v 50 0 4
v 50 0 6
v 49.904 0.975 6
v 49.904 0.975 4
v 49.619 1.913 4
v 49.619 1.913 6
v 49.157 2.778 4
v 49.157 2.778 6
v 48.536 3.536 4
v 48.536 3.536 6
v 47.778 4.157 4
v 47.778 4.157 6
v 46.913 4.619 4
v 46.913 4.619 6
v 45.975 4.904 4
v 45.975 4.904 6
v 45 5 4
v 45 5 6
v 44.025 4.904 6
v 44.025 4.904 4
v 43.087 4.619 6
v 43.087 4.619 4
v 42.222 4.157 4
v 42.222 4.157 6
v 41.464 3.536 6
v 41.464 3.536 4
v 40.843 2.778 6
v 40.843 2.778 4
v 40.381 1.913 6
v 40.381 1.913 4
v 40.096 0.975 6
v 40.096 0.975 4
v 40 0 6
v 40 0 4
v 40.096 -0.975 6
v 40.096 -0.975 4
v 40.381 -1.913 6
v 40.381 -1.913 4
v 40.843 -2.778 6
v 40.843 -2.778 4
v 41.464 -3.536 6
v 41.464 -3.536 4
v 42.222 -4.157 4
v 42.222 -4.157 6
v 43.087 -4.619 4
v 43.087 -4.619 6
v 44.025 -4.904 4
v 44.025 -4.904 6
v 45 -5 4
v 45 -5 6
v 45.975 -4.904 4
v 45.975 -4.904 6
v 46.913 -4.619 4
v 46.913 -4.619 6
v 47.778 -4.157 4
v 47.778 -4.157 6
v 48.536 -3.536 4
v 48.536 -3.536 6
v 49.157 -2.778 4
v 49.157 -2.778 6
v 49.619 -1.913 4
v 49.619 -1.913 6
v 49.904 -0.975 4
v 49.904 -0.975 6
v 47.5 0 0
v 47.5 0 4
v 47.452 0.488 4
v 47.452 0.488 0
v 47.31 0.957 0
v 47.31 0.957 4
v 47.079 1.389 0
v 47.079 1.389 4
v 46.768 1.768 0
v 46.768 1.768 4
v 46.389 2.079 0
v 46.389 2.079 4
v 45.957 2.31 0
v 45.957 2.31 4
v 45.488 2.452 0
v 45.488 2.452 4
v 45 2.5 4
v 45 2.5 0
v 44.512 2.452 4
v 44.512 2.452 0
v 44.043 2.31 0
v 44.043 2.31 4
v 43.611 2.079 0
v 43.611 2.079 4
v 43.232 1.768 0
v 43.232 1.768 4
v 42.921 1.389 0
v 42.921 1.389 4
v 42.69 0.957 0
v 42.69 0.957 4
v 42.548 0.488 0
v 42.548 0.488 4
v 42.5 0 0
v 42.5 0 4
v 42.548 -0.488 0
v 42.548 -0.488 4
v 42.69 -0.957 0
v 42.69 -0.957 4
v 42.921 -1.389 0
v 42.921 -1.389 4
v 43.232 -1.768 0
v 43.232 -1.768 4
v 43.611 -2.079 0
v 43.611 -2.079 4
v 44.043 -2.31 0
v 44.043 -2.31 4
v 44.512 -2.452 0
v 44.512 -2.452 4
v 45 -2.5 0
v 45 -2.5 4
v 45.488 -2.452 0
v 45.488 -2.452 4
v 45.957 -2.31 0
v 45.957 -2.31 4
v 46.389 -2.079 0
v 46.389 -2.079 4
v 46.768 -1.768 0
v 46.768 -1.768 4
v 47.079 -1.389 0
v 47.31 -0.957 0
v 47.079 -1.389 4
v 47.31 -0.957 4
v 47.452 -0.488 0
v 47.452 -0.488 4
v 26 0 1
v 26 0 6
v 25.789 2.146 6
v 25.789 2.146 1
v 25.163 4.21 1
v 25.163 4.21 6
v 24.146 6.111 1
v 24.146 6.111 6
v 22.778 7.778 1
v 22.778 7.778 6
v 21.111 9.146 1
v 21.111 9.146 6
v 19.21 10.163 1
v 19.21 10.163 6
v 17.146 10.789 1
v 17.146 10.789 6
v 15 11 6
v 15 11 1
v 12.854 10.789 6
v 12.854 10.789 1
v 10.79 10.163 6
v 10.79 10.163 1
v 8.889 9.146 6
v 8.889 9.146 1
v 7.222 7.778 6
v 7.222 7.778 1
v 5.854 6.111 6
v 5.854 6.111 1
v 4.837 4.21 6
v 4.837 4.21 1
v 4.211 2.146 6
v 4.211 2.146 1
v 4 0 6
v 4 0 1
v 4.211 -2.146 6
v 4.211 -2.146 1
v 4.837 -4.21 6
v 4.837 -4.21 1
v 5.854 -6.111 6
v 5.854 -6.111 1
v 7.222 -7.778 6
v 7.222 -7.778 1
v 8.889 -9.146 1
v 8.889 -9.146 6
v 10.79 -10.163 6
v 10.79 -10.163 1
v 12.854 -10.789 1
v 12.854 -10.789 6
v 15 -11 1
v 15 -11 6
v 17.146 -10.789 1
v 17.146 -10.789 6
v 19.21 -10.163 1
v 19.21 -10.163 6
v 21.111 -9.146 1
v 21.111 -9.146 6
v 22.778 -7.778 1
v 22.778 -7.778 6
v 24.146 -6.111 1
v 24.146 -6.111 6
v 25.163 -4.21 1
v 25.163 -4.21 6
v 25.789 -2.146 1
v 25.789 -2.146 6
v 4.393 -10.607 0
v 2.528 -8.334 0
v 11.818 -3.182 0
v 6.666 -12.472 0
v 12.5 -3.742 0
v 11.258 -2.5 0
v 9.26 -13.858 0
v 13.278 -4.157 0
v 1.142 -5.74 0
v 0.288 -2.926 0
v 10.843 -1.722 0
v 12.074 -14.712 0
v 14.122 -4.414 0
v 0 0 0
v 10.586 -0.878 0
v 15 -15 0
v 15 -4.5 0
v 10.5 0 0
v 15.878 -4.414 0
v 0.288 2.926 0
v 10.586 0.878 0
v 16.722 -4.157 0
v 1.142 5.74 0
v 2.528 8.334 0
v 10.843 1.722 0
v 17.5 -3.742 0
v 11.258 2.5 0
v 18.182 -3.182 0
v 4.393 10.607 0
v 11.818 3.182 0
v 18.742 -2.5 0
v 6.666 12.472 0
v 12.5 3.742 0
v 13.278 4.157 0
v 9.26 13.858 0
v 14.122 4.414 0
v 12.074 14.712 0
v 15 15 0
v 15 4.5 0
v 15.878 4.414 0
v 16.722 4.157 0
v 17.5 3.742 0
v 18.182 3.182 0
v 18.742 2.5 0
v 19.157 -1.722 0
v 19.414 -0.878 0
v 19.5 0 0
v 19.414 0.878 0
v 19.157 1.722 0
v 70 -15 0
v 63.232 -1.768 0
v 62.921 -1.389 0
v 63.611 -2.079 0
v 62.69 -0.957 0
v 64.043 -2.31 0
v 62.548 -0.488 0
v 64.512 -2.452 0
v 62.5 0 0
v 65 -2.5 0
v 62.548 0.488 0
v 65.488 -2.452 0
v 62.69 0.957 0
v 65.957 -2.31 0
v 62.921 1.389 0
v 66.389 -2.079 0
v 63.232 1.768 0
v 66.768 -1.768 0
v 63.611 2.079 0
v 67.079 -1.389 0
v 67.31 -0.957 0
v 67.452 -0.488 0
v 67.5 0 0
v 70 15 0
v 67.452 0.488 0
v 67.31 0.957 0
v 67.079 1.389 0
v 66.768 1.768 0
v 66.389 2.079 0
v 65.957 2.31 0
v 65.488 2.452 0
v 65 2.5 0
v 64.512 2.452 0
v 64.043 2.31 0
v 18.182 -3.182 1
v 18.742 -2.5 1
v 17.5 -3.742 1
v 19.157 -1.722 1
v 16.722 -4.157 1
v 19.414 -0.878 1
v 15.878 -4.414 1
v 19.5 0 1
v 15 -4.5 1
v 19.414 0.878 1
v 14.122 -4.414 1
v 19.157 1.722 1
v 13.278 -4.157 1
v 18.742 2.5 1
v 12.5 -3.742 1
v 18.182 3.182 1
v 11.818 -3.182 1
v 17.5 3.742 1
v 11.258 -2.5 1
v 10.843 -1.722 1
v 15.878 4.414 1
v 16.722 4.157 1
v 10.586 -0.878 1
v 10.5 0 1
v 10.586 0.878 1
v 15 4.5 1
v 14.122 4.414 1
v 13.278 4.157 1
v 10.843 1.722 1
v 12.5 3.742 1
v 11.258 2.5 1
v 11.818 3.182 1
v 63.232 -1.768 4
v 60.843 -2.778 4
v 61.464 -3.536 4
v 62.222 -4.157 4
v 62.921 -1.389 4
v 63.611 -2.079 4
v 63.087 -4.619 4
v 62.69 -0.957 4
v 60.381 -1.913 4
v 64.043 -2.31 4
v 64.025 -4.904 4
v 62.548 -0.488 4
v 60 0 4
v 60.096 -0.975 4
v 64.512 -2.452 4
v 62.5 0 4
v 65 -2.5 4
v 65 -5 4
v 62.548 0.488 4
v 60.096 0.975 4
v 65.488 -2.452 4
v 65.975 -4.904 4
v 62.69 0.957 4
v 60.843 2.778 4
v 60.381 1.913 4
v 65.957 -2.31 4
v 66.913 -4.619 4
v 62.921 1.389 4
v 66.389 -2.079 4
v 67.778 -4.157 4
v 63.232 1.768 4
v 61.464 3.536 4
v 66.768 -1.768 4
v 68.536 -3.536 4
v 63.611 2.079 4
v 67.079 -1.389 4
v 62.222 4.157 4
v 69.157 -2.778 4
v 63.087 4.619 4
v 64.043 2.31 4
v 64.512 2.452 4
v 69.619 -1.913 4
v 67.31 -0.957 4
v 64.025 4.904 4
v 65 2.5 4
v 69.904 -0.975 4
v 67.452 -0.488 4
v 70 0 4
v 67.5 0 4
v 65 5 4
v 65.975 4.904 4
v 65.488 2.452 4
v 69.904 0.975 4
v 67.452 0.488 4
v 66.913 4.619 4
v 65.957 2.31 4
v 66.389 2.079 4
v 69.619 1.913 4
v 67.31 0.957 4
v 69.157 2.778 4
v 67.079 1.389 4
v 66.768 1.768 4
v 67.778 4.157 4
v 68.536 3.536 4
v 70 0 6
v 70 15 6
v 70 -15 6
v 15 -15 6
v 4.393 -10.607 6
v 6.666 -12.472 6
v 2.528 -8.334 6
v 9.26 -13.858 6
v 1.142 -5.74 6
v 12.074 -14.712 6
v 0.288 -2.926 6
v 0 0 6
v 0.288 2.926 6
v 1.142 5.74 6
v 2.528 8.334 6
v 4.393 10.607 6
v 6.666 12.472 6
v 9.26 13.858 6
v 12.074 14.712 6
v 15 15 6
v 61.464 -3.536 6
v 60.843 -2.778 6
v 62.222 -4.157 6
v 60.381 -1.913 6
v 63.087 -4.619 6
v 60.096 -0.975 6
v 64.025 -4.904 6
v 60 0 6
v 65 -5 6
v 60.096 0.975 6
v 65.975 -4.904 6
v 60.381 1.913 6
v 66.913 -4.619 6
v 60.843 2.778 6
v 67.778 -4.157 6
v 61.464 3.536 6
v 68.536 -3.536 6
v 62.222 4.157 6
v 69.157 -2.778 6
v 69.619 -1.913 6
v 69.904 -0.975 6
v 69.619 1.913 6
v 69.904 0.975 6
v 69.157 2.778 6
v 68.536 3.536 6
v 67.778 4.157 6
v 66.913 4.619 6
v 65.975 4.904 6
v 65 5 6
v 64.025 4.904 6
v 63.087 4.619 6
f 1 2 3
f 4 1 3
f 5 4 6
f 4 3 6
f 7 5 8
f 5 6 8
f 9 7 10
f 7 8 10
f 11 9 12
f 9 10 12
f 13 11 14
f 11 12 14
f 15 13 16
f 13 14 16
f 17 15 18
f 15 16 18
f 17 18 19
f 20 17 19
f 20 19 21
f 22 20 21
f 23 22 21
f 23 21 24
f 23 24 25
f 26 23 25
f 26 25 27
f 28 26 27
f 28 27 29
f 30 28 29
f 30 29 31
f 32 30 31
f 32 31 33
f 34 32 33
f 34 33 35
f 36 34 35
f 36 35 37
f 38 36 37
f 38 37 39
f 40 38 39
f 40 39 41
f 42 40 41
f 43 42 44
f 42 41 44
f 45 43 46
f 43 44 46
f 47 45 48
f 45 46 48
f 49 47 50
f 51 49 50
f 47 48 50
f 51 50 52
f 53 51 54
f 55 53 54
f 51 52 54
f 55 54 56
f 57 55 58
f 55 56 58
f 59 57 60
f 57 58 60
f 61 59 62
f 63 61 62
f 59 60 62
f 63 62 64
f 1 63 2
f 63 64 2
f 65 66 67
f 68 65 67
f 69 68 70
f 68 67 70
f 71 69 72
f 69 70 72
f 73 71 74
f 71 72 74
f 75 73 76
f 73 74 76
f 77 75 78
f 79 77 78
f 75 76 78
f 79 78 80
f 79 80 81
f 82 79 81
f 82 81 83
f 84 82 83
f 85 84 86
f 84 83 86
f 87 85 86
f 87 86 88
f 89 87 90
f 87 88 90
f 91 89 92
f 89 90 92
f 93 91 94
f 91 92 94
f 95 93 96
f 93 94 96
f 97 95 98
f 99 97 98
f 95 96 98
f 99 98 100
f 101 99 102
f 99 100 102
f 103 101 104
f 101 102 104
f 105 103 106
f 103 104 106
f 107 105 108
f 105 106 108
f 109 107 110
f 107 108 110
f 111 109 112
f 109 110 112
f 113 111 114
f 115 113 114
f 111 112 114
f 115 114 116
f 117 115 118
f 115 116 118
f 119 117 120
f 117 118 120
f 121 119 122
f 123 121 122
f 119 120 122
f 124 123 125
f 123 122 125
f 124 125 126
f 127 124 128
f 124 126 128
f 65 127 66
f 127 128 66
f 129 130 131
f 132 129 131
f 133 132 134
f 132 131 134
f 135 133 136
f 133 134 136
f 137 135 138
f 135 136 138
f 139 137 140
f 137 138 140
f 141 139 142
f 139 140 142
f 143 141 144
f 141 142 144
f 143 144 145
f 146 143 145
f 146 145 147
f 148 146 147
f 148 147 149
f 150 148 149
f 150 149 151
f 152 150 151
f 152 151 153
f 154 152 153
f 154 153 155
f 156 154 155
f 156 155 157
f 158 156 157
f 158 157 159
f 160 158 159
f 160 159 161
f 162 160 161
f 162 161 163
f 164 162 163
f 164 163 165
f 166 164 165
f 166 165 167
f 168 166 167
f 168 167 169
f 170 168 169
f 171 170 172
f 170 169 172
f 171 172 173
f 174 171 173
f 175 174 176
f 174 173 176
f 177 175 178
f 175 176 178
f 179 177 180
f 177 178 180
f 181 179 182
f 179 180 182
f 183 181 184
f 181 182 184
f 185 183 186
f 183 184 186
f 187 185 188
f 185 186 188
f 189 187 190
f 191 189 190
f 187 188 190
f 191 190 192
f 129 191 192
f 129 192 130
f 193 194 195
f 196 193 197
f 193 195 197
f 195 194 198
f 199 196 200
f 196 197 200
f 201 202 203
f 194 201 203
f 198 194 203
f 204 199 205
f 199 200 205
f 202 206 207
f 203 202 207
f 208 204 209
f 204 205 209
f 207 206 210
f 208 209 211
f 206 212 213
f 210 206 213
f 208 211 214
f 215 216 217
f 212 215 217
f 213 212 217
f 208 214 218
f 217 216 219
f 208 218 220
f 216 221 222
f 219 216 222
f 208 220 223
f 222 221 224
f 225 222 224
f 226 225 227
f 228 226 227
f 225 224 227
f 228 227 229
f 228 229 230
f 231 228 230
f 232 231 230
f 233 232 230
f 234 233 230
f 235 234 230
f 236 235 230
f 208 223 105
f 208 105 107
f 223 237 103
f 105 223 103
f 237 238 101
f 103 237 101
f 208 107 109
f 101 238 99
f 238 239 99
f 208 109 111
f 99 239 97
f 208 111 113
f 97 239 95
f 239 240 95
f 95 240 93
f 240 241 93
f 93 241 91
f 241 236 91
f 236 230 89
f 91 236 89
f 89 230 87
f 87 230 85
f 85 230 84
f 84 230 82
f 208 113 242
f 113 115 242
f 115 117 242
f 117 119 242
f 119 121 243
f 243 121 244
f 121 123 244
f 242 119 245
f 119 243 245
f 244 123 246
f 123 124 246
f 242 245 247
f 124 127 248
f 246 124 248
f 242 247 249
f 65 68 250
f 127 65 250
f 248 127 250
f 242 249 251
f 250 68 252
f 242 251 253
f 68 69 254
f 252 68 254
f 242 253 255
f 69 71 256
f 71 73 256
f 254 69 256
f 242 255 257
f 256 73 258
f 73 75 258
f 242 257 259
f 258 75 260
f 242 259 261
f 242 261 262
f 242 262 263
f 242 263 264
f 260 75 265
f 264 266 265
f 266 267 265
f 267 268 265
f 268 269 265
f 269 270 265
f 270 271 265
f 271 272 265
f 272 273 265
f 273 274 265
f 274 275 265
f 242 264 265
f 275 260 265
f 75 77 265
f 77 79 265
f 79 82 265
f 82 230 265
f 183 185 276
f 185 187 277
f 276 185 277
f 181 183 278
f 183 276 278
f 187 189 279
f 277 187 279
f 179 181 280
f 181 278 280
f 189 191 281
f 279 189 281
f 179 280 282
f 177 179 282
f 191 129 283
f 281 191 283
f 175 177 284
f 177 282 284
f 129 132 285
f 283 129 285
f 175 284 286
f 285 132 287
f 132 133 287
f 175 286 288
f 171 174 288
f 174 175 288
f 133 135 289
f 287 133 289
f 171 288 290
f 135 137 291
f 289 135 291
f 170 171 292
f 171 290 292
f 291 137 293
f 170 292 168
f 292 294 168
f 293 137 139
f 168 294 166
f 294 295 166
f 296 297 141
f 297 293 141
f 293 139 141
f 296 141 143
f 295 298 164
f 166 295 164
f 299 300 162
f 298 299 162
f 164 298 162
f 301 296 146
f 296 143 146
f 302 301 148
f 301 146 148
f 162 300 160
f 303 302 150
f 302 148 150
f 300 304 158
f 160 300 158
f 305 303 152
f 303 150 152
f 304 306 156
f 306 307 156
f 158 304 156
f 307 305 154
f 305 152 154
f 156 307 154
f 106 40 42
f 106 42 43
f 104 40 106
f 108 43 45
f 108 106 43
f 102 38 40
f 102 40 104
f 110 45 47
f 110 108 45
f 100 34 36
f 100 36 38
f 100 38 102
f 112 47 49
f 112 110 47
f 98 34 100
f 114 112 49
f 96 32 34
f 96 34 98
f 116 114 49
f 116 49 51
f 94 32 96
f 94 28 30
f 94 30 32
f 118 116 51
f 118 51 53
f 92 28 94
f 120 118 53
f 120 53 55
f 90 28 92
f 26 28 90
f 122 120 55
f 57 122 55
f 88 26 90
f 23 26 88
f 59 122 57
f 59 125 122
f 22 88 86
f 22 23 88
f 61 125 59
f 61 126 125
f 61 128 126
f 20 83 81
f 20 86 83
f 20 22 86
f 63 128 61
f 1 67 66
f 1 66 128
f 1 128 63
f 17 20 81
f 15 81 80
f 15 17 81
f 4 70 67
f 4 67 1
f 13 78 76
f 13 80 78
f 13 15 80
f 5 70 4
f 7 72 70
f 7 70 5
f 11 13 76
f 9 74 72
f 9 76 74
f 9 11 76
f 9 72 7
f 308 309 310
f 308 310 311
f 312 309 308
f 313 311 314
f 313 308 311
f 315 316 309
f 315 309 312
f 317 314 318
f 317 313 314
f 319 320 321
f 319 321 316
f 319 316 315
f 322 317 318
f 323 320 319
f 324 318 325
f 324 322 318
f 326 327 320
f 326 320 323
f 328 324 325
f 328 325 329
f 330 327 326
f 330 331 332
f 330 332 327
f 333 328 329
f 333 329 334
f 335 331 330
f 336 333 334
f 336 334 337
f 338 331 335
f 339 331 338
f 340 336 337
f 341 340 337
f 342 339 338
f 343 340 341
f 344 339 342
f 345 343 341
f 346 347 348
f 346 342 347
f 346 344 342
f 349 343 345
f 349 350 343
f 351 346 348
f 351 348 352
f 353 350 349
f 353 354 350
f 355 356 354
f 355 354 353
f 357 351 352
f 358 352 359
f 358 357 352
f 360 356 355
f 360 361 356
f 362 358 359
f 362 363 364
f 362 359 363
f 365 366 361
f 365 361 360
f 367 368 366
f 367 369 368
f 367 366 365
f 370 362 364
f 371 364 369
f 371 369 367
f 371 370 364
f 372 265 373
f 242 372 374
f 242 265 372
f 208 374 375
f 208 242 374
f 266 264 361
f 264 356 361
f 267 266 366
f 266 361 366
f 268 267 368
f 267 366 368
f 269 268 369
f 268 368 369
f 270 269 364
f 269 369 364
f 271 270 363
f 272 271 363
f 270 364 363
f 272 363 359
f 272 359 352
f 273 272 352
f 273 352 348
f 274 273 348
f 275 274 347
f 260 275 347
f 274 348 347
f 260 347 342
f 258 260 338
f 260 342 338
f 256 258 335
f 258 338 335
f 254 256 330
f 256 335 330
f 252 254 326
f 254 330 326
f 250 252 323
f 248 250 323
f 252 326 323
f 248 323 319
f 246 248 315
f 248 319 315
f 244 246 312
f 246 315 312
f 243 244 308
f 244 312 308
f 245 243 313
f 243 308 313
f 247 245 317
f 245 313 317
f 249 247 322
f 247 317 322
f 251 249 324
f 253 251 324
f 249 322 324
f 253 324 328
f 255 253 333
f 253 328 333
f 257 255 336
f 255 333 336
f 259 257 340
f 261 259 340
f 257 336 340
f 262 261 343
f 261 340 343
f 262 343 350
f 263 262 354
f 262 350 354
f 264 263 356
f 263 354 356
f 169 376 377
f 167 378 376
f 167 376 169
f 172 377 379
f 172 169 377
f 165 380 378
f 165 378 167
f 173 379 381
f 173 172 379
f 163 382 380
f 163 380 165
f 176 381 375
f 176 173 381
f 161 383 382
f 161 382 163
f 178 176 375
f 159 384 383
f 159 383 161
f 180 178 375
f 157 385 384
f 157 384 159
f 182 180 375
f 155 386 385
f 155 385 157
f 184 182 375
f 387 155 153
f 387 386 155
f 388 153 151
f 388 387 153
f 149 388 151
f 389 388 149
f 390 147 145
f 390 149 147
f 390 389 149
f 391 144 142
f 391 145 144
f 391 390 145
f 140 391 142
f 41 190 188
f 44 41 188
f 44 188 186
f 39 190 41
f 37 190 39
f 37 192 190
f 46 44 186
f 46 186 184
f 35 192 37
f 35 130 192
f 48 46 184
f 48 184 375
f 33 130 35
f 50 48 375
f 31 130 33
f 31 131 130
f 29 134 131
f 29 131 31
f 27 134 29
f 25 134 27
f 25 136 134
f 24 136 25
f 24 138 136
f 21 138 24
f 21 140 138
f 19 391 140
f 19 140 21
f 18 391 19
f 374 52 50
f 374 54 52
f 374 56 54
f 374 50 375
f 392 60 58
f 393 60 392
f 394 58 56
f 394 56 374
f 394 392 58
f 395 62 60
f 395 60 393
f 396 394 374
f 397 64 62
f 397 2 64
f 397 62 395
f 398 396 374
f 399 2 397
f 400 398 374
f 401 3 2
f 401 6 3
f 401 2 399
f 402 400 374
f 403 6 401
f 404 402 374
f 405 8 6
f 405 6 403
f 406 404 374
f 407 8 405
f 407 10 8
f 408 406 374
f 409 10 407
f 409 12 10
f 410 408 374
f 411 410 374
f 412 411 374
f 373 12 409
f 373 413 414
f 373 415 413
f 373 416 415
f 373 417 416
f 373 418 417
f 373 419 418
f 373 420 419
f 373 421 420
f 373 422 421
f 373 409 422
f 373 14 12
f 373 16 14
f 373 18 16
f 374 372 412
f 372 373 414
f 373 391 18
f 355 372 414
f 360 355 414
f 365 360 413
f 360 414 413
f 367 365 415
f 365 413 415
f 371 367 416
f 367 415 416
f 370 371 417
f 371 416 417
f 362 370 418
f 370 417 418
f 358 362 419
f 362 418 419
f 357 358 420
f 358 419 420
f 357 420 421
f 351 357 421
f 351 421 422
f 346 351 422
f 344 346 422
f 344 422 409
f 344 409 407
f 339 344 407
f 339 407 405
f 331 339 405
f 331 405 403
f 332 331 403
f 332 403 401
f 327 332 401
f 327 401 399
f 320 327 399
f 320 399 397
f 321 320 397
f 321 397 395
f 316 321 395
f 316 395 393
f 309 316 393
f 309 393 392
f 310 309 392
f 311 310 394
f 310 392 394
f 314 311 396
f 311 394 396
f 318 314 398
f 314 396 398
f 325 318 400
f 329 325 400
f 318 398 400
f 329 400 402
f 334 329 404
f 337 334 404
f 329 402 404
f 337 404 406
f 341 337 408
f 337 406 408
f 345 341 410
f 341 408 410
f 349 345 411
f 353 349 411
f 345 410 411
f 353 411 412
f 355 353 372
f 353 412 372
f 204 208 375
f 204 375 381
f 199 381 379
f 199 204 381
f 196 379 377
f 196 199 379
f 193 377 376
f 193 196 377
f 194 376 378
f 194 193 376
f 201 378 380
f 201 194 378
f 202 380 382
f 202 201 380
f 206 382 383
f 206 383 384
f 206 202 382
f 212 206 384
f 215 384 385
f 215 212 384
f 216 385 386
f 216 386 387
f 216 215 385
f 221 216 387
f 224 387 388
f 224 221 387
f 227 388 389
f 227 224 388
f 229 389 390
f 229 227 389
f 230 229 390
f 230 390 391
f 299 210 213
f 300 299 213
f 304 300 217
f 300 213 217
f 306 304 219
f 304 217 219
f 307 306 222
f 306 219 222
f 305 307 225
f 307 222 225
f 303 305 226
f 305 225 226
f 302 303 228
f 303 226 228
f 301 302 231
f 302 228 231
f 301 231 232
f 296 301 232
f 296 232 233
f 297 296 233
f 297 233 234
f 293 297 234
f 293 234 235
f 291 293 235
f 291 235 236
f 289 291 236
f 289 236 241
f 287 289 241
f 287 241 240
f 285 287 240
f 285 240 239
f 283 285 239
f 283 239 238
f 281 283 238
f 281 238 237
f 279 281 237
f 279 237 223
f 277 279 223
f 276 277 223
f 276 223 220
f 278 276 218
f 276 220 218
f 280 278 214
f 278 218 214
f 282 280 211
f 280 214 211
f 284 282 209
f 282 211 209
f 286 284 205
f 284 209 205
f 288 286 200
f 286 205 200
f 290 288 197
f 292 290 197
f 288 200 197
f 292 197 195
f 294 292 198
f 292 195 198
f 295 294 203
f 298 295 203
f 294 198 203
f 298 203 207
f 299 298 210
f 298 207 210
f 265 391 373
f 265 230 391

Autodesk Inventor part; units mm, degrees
ref_plane "YZ Plane" through (0, 0, 0) normal (1, 0, 0) x (0, 1, 0)
ref_plane "XZ Plane" through (0, 0, 0) normal (0, 1, 0) x (-1, 0, 0)
ref_plane "XY Plane" through (0, 0, 0) normal (0, 0, 1) x (1, 0, 0)
sketch "Sketch1" plane through (0, 0, 0) normal (0, 0, 1) x (1, 0, 0)
  line L0 (15, 15) -> (70, 15)
  line L1 (70, 15) -> (70, -15)
  line L2 (70, -15) -> (15, -15)
  line L3 (-14, 0) -> (84, 0) projected
  arc A0 (15, 15) -> (15, -15) centre (15, 0) ccw
  line L4 (0, -21) -> (0, 21) projected
  line L5 (15, 0) -> (70, 0)
  point P0 (0, 0)
  dimension "d4" = 30
  dimension "d15" = 15
  dimension "d16" = 55
extrude "Extrusion1" add sketch "Sketch1" along normal blind 6
sketch "Sketch2" plane through (0, 0, 6) normal (0, 0, 1) x (1, 0, 0)
  circle A0 centre (15, 0) radius 11
  arc A1 (15, 15) -> (15, -15) centre (15, 0) ccw projected
  point P0 (0, 0)
  dimension "d7" = 22
extrude "Extrusion2" cut sketch "Sketch2" against normal blind 10
sketch "Sketch3" plane through (0, 0, 6) normal (0, 0, 1) x (1, 0, 0)
  circle A0 centre (65, 0) radius 2.5
  line L0 (70, -15) -> (70, 15) projected
  circle A1 centre (45, 0) radius 2.5
  point P0 (0, 0)
  dimension "d10" = 5
  dimension "d12" = 5
  dimension "d26" = 5
  dimension "d27" = 20
extrude "Extrusion3" cut sketch "Sketch3" against normal blind 10
sketch "Sketch4" plane through (0, 0, 0) normal (0, 0, -1) x (-1, 0, 0)
  circle A0 centre (-15, 0) radius 15
  arc A1 (-15, -15) -> (-15, 15) centre (-15, 0) ccw projected
  circle A2 centre (-15, 0) radius 11 projected
  point P0 (0, 0)
extrude "Extrusion4" add sketch "Sketch4" against normal blind 1 contours A0 | A2
sketch "Sketch6" plane through (0, 0, 6) normal (0, 0, 1) x (1, 0, 0)
  circle A0 centre (65, 0) radius 2.5 projected
  circle A1 centre (65, 0) radius 5
  circle A2 centre (45, 0) radius 5
  circle A3 centre (45, 0) radius 2.5 projected
  point P0 (0, 0)
  dimension "d22" = 10
  dimension "d28" = 10
extrude "Extrusion6" cut sketch "Sketch6" against normal blind 2
sketch "Sketch7" plane through (0, 0, 0) normal (0, 0, -1) x (-1, 0, 0)
  arc A0 (-15, -15) -> (-15, 15) centre (-15, 0) ccw projected
  circle A1 centre (-15, 0) radius 4.5
  point P0 (0, 0)
  dimension "d29" = 9
extrude "Extrusion7" cut sketch "Sketch7" against normal blind 2
properties part number "bearing_mount"
